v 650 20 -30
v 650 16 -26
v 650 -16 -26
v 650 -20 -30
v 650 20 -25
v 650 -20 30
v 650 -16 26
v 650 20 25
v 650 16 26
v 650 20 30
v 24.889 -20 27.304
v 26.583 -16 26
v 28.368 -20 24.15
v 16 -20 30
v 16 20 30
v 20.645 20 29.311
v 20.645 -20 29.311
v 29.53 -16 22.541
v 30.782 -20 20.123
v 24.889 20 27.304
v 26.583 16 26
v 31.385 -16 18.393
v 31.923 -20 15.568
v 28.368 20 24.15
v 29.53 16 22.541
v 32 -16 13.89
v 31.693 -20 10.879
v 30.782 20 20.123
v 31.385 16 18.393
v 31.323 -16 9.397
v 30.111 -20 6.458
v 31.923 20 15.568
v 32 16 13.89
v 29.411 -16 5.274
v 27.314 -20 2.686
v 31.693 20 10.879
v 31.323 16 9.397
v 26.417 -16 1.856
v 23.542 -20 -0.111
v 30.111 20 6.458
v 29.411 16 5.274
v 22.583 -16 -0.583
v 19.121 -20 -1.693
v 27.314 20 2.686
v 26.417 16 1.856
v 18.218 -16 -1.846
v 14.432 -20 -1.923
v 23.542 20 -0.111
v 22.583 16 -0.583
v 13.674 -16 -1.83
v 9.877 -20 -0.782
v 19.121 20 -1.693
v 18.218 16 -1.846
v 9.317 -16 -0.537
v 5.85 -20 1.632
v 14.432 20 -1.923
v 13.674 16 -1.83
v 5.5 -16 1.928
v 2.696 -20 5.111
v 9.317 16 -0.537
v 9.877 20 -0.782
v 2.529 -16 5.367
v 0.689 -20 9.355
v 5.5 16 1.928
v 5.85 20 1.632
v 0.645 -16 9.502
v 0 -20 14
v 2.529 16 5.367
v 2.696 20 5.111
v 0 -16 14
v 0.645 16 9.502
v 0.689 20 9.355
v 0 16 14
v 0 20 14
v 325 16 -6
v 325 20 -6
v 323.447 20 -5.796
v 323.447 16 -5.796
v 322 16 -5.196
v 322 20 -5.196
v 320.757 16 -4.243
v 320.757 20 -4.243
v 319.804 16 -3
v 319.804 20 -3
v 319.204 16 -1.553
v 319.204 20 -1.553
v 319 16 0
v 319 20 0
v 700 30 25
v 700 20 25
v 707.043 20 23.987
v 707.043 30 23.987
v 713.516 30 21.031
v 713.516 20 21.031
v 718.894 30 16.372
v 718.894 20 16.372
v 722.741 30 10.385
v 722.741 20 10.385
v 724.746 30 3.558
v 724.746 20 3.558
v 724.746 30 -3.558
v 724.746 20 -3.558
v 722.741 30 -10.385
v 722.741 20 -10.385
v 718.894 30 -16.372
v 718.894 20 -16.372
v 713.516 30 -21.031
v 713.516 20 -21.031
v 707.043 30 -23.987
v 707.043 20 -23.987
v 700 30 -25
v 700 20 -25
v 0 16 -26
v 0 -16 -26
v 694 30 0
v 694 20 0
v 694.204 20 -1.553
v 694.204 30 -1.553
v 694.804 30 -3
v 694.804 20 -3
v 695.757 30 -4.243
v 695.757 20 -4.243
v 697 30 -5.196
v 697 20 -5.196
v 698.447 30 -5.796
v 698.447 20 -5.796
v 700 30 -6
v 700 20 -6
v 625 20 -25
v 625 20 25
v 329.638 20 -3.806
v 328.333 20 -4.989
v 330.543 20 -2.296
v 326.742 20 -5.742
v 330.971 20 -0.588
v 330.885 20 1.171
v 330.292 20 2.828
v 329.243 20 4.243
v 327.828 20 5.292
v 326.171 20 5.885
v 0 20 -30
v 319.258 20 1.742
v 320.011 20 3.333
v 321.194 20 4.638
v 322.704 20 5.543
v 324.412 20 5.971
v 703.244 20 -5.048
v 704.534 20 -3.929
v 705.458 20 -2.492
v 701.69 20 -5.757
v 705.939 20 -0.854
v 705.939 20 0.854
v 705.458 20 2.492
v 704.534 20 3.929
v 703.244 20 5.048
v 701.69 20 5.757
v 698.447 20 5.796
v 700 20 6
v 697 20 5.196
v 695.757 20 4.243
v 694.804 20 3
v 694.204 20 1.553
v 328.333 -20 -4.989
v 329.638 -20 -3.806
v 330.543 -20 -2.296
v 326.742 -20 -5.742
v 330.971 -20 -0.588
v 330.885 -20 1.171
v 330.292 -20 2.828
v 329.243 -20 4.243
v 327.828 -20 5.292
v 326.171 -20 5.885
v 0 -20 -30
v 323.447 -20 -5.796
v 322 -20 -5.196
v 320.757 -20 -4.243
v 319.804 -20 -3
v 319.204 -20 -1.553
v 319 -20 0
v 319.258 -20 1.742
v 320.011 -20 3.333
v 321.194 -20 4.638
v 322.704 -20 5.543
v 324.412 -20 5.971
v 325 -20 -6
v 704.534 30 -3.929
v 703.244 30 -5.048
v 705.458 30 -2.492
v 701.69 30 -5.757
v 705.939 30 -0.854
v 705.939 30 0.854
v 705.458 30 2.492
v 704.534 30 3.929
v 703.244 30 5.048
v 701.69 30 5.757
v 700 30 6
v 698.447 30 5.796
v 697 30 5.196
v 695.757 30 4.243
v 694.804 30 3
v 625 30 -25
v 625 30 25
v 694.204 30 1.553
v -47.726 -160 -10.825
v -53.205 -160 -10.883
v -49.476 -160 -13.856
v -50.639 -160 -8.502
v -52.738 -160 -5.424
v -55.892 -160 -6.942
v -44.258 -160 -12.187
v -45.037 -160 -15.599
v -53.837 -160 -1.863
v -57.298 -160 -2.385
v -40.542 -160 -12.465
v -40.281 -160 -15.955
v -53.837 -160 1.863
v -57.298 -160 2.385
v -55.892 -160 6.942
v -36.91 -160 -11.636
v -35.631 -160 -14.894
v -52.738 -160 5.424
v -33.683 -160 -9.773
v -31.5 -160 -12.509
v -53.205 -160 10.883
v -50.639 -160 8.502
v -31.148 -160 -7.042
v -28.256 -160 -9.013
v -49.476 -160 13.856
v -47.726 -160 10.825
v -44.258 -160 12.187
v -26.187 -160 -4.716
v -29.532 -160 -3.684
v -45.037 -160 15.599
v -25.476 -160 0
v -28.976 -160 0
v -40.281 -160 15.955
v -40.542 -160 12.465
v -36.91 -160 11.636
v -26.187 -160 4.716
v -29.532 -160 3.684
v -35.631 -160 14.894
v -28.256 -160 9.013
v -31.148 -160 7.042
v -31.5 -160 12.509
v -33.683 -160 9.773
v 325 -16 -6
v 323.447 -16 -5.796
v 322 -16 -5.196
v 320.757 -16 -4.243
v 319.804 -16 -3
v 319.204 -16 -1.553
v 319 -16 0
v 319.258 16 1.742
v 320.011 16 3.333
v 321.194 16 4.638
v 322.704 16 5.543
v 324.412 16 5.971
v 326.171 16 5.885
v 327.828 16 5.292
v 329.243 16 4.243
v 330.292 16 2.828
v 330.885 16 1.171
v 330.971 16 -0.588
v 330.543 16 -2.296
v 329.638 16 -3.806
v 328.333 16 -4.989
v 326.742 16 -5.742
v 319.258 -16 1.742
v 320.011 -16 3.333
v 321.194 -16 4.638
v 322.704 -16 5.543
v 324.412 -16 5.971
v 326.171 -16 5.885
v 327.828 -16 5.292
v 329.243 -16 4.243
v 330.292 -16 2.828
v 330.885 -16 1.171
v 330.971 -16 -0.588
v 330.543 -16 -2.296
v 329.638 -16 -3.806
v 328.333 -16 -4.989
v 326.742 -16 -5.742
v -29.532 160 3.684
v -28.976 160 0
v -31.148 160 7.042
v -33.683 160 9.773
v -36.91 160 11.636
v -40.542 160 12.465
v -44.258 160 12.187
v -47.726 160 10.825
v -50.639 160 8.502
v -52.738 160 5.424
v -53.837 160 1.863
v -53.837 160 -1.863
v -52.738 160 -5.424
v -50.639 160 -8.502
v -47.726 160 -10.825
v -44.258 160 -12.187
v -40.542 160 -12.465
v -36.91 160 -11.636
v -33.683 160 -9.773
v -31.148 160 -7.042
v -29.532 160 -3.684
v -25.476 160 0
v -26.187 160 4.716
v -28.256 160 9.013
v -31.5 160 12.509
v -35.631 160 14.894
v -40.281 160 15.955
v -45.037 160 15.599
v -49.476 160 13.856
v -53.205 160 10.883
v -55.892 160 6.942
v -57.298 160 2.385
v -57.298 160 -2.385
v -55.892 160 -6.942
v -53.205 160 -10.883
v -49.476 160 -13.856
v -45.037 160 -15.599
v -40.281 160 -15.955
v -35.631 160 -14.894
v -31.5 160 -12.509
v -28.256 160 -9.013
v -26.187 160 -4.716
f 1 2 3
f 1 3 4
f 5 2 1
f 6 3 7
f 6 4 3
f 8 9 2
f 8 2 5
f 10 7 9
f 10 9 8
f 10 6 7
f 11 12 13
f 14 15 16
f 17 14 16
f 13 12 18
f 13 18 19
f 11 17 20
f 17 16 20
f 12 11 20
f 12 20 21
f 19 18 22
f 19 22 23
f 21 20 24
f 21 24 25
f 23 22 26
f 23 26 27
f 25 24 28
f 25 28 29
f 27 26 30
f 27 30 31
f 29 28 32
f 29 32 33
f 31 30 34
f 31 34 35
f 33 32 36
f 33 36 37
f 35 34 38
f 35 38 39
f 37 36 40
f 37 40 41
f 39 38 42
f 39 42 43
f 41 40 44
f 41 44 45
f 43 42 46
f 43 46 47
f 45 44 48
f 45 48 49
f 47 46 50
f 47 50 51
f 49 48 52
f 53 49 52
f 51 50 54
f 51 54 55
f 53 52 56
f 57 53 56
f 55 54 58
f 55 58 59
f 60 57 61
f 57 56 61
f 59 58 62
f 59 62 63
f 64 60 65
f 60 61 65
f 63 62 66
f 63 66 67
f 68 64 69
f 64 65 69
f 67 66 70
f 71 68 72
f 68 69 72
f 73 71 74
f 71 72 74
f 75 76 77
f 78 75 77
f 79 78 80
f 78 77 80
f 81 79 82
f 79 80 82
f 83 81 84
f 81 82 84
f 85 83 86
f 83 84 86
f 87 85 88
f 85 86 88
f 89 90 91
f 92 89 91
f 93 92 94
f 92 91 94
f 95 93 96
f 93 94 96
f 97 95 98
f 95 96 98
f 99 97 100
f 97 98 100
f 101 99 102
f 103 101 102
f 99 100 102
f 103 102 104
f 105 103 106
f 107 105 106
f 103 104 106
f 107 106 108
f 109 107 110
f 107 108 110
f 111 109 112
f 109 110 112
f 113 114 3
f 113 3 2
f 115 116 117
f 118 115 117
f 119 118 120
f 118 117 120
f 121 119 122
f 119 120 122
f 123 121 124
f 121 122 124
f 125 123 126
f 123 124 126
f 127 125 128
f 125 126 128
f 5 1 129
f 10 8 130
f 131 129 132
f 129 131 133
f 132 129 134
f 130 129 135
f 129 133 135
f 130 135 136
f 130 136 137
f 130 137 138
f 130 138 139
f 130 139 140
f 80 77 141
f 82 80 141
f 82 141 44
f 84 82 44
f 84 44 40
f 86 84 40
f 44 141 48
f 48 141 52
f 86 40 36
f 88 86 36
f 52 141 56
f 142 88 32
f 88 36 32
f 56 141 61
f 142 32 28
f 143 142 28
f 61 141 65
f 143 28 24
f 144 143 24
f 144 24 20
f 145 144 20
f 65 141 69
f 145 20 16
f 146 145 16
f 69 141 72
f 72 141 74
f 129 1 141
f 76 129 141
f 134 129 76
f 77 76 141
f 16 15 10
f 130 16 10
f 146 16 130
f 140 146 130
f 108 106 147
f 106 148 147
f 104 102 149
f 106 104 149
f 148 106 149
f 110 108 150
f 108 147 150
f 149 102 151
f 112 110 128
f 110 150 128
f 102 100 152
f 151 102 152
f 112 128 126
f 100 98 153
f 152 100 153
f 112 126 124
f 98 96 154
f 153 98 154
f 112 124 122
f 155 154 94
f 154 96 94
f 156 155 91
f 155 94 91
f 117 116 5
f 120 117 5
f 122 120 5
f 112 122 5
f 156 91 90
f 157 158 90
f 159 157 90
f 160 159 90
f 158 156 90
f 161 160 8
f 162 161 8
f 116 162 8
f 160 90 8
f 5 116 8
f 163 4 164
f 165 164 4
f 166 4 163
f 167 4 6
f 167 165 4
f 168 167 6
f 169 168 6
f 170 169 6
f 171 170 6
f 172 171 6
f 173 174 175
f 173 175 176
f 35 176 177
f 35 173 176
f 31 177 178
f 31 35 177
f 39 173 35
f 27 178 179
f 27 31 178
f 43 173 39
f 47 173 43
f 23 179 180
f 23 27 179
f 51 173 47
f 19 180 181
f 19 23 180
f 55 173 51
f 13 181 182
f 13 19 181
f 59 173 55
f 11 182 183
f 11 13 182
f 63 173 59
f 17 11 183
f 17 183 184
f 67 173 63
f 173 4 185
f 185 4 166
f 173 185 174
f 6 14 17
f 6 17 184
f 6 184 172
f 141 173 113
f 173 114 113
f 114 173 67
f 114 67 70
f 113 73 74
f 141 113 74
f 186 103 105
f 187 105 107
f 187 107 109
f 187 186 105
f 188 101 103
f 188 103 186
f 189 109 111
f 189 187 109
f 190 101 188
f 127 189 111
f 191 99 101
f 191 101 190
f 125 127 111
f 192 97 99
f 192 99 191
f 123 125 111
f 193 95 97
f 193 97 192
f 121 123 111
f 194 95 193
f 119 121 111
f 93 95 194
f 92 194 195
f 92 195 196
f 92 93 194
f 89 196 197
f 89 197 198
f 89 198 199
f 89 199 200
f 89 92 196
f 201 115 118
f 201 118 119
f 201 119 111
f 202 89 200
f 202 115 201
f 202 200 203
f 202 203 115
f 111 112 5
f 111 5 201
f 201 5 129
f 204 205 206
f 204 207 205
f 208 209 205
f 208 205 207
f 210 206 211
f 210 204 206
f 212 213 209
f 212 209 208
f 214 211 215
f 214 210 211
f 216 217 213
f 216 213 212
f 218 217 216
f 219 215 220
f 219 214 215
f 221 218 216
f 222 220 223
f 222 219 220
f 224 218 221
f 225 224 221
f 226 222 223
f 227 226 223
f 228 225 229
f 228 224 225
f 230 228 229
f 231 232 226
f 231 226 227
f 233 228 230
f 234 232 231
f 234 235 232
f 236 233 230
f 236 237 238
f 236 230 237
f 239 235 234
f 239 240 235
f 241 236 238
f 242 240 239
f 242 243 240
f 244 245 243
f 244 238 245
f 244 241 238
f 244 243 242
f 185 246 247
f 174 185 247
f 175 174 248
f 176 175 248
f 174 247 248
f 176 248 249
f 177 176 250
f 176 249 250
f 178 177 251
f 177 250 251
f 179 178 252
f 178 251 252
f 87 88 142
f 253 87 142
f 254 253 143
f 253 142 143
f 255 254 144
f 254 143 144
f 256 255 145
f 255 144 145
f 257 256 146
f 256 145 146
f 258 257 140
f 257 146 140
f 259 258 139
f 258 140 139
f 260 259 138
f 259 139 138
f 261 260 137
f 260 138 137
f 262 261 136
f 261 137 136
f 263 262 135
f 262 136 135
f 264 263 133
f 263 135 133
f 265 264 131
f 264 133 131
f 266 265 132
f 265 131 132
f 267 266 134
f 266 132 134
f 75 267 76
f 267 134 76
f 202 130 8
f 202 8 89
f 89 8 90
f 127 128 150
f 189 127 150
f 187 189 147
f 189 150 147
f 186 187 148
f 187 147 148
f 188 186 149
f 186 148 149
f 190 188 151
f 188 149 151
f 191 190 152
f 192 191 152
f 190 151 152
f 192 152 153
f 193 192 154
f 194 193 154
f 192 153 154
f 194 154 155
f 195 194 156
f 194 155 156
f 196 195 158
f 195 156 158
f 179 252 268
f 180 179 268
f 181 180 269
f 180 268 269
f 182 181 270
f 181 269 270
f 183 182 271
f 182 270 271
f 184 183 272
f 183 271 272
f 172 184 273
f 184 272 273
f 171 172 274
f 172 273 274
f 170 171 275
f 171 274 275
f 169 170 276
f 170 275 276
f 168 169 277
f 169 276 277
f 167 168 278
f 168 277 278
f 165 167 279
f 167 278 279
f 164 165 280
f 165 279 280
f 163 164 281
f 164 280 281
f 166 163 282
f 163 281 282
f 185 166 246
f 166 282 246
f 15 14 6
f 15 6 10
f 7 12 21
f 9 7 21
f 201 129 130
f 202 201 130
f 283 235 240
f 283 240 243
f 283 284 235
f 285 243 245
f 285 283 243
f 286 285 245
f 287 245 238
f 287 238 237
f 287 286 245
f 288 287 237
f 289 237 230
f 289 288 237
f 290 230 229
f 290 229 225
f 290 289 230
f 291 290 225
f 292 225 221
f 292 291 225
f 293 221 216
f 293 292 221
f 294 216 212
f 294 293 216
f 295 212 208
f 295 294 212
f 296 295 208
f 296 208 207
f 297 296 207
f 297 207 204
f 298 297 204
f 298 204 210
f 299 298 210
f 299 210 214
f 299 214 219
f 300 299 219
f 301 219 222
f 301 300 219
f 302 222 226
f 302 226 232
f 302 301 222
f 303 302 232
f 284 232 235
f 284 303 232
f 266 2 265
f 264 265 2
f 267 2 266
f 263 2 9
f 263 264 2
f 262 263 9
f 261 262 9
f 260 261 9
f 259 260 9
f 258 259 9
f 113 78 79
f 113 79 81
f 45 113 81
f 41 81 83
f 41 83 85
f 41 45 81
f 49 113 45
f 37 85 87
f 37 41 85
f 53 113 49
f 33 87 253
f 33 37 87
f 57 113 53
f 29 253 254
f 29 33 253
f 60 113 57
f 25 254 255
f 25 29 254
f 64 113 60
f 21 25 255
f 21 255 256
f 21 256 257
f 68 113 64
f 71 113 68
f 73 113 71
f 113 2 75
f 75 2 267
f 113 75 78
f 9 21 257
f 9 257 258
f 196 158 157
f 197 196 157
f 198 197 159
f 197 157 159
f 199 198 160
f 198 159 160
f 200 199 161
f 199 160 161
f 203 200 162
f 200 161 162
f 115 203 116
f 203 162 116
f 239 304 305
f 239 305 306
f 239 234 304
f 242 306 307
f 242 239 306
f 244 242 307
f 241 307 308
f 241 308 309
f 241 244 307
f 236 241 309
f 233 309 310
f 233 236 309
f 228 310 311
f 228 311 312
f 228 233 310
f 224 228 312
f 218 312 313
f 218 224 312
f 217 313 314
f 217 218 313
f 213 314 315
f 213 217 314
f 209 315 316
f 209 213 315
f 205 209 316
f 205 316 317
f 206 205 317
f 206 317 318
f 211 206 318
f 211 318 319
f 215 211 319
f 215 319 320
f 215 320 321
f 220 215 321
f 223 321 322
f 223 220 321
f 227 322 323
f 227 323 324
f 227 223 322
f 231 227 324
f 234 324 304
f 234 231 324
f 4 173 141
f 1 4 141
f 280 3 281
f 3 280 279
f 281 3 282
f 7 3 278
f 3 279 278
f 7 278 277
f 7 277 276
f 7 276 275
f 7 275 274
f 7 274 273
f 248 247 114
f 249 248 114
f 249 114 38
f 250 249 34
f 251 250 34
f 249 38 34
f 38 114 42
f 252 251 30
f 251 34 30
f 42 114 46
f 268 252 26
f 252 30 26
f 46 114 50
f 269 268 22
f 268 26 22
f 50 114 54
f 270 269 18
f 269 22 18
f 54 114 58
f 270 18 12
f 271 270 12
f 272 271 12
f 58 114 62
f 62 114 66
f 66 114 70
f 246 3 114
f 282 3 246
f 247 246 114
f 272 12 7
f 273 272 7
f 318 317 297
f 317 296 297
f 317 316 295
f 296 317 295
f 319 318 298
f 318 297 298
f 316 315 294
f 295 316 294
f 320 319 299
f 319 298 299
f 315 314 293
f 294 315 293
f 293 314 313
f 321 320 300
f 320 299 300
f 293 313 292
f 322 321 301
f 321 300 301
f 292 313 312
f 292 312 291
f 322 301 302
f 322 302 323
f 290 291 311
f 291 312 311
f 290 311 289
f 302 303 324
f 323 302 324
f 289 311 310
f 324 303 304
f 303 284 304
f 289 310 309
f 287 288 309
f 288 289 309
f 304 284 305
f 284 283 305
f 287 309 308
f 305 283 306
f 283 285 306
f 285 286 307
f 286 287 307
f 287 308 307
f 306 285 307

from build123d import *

# Parameters (mm, degrees)
F0_W     = 40
F0_H     = 60
F0_W_2   = 32
F0_H_2   = 52
F1_DEPTH = 650
F3_DEPTH = 10
F5_DEPTH = 40
F7_DEPTH = 40
F8_R     = 16
F8_R_2   = 12.5
F9_DEPTH = 160


with BuildPart() as f1:
    # F0 (on Right) → F1 (new body)
    with BuildSketch(Plane.YZ):
        Rectangle(F0_W, F0_H)
        Rectangle(F0_W_2, F0_H_2, mode=Mode.SUBTRACT)
    extrude(amount=F1_DEPTH)

    # F2 (on face) → F3 (join)
    with BuildSketch(Plane(origin=(0, 20, 0), x_dir=(-1, 0, 0), z_dir=(0, 1, 0))):
        with BuildLine():
            Line((-625, -25), (-625, 0))
            Line((-625, 0), (-625, 25))
            Line((-625, 25), (-700, 25))
            ThreePointArc((-700, 25), (-682.3223304703, 17.6776695297), (-675, 0))
            ThreePointArc((-675, 0), (-682.3223304703, -17.6776695297), (-700, -25))
            Line((-700, -25), (-625, -25))
        make_face()
        with BuildLine():
            ThreePointArc((-700, 25), (-725, 0), (-700, -25))
            Line((-700, -25), (-700, -6))
            ThreePointArc((-700, -6), (-706, 0), (-700, 6))
            Line((-700, 6), (-700, 25))
        make_face()
        with BuildLine():
            Line((-700, -6), (-700, -25))
            ThreePointArc((-700, -25), (-682.3223304703, -17.6776695297), (-675, 0))
            ThreePointArc((-675, 0), (-682.3223304703, 17.6776695297), (-700, 25))
            Line((-700, 25), (-700, 6))
            ThreePointArc((-700, 6), (-695.7573593129, 4.2426406871), (-694, 0))
            ThreePointArc((-694, 0), (-695.7573593129, -4.2426406871), (-700, -6))
        make_face()
    extrude(amount=F3_DEPTH)

    # F4 (on face) → F5 (cut)
    with BuildSketch(Plane(origin=(0, 20, 0), x_dir=(-1, 0, 0), z_dir=(0, 1, 0))):
        with BuildLine():
            Line((0, 14), (0, 30))
            Line((0, 30), (-16, 30))
            ThreePointArc((-16, 30), (-4.686291501, 25.313708499), (0, 14))
        make_face()
        with BuildLine():
            ThreePointArc((0, 14), (-4.686291501, 25.313708499), (-16, 30))
            ThreePointArc((-16, 30), (-27.313708499, 2.686291501), (0, 14))
        make_face()
    extrude(amount=-F5_DEPTH, mode=Mode.SUBTRACT)

    # F6 (on face) → F7 (cut)
    with BuildSketch(Plane(origin=(0, 20, 0), x_dir=(-1, 0, 0), z_dir=(0, 1, 0))):
        with BuildLine():
            ThreePointArc((-325, -6), (-320.7573593129, -4.2426406871), (-319, 0))
            ThreePointArc((-319, 0), (-329.2426406871, 4.2426406871), (-325, -6))
        make_face()
    extrude(amount=-F7_DEPTH, mode=Mode.SUBTRACT)


with BuildPart() as f9:
    # F8 (on Front) → F9 (new body, symmetric)
    with BuildSketch(Plane.XZ):
        with Locations((-41.4762636906, 0)):
            Circle(F8_R)
        with Locations((-41.4762636906, 0)):
            Circle(F8_R_2, mode=Mode.SUBTRACT)
    extrude(amount=F9_DEPTH, both=True)


solid = Compound([f1.part, f9.part])
